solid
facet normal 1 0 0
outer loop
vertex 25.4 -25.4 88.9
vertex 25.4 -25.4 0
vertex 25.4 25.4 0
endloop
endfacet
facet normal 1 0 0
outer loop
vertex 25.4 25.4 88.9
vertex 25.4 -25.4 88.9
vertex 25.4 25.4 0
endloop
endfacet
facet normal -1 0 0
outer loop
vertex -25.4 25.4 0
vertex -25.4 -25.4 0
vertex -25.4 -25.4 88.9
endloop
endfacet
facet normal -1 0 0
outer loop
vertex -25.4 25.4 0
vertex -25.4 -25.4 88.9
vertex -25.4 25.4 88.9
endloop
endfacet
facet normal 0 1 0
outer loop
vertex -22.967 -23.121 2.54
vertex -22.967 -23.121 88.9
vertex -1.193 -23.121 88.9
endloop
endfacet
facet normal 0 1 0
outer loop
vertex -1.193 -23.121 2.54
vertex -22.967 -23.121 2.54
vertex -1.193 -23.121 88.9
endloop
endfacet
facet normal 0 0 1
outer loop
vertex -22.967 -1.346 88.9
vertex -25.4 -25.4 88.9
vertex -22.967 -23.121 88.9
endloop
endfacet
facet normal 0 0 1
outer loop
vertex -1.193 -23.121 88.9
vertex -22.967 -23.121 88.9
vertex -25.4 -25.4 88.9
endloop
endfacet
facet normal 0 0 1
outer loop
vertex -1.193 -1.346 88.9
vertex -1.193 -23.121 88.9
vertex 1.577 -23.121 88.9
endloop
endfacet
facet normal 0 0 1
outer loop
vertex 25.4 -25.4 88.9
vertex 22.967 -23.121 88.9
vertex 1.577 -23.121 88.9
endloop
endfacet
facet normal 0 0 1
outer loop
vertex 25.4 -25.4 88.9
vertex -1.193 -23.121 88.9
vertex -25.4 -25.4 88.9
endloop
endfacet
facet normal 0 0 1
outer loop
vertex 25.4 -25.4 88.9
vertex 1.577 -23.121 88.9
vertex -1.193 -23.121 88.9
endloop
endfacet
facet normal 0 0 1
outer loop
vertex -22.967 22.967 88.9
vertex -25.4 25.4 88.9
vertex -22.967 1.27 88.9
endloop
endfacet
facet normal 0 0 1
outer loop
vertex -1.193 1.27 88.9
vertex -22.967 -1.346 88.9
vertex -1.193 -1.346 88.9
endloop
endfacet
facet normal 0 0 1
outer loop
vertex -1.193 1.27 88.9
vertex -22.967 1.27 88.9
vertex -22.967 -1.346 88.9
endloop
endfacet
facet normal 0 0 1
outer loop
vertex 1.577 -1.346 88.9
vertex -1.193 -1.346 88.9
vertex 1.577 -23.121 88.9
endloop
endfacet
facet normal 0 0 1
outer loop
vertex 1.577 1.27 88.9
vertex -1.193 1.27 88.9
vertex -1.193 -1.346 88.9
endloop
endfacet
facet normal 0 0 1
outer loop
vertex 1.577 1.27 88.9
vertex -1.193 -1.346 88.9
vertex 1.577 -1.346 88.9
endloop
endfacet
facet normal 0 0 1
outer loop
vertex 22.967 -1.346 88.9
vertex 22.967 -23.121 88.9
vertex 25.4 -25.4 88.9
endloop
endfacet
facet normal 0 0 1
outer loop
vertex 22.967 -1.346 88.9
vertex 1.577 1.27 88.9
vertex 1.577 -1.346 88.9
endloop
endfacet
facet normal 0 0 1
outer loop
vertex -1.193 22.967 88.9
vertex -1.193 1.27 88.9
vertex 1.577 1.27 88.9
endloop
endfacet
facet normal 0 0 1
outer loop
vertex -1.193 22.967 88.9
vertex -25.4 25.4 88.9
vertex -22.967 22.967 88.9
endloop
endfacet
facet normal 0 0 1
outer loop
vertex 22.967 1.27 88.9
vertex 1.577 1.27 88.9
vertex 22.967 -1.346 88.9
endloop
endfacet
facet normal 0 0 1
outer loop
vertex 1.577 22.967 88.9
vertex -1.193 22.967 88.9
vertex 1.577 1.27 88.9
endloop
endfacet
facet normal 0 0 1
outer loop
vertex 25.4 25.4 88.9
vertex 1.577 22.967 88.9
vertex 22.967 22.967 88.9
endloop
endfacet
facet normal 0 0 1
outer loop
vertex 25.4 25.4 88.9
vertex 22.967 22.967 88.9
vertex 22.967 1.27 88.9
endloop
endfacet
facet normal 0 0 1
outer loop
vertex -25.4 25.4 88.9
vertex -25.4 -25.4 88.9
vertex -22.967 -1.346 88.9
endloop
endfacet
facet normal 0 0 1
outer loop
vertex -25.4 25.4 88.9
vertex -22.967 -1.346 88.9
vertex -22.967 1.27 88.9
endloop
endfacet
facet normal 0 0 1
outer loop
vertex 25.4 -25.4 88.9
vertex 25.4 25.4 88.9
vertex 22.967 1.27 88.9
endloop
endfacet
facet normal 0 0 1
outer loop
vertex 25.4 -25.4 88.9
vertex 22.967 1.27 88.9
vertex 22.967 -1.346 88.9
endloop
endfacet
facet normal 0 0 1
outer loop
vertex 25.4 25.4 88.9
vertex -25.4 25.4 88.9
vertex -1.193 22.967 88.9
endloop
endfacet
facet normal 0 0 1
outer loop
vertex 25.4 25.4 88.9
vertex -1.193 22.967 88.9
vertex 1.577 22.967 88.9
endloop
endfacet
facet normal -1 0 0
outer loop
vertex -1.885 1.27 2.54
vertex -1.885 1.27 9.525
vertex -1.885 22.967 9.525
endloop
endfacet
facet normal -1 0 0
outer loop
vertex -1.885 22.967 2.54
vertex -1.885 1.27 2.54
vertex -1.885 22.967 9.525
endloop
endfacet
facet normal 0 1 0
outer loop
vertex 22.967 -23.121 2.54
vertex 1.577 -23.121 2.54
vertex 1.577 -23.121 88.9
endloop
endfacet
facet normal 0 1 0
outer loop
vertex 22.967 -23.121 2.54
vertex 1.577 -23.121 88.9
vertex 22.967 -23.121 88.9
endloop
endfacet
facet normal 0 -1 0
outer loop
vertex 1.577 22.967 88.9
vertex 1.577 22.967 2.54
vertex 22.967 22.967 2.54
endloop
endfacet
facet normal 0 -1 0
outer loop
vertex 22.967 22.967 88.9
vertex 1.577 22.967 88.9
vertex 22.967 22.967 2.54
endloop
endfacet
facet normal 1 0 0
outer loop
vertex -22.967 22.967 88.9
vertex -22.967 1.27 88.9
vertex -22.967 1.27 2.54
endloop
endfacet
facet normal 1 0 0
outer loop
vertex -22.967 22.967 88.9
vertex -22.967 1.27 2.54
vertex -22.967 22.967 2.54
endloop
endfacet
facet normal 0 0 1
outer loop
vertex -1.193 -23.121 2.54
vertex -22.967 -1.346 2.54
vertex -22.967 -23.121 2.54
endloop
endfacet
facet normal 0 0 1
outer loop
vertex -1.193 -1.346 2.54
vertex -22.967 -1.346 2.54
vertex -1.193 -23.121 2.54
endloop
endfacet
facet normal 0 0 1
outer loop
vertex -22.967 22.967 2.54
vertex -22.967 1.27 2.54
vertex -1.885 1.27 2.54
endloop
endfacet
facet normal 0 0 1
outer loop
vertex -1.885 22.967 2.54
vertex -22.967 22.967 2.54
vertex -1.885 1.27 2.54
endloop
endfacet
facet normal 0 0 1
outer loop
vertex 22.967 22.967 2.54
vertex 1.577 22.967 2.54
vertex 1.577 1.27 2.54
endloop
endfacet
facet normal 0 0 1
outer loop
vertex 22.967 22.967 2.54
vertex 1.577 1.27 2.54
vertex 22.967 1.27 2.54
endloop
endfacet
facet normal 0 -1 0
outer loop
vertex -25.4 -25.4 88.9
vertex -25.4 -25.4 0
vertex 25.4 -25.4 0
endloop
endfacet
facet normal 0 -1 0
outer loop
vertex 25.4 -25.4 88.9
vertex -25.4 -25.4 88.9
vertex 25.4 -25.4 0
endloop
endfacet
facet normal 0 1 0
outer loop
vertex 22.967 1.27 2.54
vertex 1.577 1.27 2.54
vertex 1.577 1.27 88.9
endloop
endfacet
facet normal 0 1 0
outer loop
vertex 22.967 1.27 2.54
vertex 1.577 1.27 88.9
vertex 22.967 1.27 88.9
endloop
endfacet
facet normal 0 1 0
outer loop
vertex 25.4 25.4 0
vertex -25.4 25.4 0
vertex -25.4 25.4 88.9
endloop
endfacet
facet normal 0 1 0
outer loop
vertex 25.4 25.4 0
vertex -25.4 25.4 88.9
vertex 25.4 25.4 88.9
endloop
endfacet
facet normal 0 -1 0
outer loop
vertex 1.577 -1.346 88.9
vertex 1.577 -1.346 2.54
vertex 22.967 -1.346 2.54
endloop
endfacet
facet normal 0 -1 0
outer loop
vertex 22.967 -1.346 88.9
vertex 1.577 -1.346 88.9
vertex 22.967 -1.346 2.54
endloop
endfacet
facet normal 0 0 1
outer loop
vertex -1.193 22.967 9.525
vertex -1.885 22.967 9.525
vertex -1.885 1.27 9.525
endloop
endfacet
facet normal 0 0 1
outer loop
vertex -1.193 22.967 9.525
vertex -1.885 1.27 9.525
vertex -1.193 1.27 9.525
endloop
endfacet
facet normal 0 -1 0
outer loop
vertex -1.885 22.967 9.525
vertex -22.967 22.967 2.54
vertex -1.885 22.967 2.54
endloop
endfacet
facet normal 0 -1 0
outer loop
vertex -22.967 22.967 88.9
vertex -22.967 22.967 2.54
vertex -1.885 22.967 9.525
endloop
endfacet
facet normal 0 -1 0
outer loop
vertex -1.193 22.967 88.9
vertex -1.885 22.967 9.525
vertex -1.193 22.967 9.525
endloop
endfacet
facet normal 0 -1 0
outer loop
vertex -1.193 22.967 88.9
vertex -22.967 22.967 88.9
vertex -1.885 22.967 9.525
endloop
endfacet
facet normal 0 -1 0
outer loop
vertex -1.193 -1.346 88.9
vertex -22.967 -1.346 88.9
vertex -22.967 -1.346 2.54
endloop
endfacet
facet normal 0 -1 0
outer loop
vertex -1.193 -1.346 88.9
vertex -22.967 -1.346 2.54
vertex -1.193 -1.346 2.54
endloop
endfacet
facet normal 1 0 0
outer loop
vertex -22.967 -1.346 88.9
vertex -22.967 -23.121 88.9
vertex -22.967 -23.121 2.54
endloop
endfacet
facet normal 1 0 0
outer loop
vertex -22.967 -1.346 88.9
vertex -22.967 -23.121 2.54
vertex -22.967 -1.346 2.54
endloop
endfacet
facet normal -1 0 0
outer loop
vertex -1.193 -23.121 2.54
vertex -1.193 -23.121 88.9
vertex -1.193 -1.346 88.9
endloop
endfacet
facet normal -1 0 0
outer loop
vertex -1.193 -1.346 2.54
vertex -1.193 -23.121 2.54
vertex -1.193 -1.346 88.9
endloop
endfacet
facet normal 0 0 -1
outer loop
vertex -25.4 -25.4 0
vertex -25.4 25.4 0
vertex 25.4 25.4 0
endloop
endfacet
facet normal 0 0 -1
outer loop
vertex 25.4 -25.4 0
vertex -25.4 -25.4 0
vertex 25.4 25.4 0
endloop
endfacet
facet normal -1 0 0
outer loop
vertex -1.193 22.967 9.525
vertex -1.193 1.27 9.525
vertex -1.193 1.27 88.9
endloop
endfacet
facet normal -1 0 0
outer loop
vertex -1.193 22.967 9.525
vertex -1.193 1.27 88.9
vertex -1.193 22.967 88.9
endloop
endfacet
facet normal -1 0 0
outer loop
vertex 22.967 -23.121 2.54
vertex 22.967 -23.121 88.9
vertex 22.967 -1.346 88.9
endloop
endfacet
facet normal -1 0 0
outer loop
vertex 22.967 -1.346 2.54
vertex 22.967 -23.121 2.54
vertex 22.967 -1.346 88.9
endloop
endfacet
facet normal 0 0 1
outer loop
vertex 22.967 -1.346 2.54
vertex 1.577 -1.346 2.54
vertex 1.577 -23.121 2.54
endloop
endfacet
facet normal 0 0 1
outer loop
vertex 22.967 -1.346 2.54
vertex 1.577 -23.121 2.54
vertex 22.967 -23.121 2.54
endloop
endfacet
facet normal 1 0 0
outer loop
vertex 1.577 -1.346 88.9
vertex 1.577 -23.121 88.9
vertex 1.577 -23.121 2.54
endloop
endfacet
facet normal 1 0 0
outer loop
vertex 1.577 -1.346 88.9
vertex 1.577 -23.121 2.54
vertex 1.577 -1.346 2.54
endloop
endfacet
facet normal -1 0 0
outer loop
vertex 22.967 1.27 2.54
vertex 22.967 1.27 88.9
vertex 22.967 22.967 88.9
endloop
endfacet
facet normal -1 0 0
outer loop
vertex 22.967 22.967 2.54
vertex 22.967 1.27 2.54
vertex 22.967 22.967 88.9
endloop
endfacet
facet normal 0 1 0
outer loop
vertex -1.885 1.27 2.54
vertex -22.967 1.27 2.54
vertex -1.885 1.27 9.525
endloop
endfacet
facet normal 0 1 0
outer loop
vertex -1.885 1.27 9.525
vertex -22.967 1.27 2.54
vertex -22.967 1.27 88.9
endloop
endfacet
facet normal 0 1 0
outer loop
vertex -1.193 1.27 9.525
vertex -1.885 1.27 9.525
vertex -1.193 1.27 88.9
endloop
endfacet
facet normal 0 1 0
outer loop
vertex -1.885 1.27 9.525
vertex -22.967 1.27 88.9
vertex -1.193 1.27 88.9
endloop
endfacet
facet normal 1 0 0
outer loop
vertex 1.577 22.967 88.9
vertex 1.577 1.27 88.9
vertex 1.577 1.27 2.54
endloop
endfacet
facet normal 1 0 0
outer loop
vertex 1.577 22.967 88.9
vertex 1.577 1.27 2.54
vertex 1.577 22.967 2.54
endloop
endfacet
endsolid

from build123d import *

# Parameters (mm, degrees)
F0_W     = 50.8
F0_H     = 50.8
F1_DEPTH = 88.9
F2_W     = 21.774474
F2_H     = 21.774474
F2_W_2   = 21.389768
F2_H_2   = 21.697533
F3_DEPTH = 79.375
F2_W_3   = 21.082
F4_DEPTH = 86.36
F5_W     = 0.692474
F5_H     = 21.697533
F6_DEPTH = 79.375


with BuildPart() as f1:
    # F0 (on Top) → F1 (new body)
    with BuildSketch(Plane.XY):
        Rectangle(F0_W, F0_H)
    extrude(amount=F1_DEPTH)

    # F2 (on face) → F3 (cut)
    with BuildSketch(Plane.XY.offset(88.9)):
        with Locations((-12.079832, -12.233618)):
            Rectangle(F2_W, F2_H)
        with Locations((12.272187, -12.233618)):
            Rectangle(F2_W_2, F2_H)
        with Locations((12.272187, 12.1184)):
            Rectangle(F2_W_2, F2_H_2)
    extrude(amount=-F3_DEPTH, mode=Mode.SUBTRACT)

    # F2 (on face) → F4 (cut)
    with BuildSketch(Plane.XY.offset(88.9)):
        with Locations((-12.426069, 12.1184)):
            Rectangle(F2_W_3, F2_H_2)
        with Locations((-12.079832, -12.233618)):
            Rectangle(F2_W, F2_H)
        with Locations((12.272187, -12.233618)):
            Rectangle(F2_W_2, F2_H)
        with Locations((12.272187, 12.1184)):
            Rectangle(F2_W_2, F2_H_2)
    extrude(amount=-F4_DEPTH, mode=Mode.SUBTRACT)

    # F5 (on face) → F6 (cut)
    with BuildSketch(Plane.XY.offset(88.9)):
        with Locations((-1.538832, 12.1184)):
            Rectangle(F5_W, F5_H)
    extrude(amount=-F6_DEPTH, mode=Mode.SUBTRACT)


solid = f1.part
